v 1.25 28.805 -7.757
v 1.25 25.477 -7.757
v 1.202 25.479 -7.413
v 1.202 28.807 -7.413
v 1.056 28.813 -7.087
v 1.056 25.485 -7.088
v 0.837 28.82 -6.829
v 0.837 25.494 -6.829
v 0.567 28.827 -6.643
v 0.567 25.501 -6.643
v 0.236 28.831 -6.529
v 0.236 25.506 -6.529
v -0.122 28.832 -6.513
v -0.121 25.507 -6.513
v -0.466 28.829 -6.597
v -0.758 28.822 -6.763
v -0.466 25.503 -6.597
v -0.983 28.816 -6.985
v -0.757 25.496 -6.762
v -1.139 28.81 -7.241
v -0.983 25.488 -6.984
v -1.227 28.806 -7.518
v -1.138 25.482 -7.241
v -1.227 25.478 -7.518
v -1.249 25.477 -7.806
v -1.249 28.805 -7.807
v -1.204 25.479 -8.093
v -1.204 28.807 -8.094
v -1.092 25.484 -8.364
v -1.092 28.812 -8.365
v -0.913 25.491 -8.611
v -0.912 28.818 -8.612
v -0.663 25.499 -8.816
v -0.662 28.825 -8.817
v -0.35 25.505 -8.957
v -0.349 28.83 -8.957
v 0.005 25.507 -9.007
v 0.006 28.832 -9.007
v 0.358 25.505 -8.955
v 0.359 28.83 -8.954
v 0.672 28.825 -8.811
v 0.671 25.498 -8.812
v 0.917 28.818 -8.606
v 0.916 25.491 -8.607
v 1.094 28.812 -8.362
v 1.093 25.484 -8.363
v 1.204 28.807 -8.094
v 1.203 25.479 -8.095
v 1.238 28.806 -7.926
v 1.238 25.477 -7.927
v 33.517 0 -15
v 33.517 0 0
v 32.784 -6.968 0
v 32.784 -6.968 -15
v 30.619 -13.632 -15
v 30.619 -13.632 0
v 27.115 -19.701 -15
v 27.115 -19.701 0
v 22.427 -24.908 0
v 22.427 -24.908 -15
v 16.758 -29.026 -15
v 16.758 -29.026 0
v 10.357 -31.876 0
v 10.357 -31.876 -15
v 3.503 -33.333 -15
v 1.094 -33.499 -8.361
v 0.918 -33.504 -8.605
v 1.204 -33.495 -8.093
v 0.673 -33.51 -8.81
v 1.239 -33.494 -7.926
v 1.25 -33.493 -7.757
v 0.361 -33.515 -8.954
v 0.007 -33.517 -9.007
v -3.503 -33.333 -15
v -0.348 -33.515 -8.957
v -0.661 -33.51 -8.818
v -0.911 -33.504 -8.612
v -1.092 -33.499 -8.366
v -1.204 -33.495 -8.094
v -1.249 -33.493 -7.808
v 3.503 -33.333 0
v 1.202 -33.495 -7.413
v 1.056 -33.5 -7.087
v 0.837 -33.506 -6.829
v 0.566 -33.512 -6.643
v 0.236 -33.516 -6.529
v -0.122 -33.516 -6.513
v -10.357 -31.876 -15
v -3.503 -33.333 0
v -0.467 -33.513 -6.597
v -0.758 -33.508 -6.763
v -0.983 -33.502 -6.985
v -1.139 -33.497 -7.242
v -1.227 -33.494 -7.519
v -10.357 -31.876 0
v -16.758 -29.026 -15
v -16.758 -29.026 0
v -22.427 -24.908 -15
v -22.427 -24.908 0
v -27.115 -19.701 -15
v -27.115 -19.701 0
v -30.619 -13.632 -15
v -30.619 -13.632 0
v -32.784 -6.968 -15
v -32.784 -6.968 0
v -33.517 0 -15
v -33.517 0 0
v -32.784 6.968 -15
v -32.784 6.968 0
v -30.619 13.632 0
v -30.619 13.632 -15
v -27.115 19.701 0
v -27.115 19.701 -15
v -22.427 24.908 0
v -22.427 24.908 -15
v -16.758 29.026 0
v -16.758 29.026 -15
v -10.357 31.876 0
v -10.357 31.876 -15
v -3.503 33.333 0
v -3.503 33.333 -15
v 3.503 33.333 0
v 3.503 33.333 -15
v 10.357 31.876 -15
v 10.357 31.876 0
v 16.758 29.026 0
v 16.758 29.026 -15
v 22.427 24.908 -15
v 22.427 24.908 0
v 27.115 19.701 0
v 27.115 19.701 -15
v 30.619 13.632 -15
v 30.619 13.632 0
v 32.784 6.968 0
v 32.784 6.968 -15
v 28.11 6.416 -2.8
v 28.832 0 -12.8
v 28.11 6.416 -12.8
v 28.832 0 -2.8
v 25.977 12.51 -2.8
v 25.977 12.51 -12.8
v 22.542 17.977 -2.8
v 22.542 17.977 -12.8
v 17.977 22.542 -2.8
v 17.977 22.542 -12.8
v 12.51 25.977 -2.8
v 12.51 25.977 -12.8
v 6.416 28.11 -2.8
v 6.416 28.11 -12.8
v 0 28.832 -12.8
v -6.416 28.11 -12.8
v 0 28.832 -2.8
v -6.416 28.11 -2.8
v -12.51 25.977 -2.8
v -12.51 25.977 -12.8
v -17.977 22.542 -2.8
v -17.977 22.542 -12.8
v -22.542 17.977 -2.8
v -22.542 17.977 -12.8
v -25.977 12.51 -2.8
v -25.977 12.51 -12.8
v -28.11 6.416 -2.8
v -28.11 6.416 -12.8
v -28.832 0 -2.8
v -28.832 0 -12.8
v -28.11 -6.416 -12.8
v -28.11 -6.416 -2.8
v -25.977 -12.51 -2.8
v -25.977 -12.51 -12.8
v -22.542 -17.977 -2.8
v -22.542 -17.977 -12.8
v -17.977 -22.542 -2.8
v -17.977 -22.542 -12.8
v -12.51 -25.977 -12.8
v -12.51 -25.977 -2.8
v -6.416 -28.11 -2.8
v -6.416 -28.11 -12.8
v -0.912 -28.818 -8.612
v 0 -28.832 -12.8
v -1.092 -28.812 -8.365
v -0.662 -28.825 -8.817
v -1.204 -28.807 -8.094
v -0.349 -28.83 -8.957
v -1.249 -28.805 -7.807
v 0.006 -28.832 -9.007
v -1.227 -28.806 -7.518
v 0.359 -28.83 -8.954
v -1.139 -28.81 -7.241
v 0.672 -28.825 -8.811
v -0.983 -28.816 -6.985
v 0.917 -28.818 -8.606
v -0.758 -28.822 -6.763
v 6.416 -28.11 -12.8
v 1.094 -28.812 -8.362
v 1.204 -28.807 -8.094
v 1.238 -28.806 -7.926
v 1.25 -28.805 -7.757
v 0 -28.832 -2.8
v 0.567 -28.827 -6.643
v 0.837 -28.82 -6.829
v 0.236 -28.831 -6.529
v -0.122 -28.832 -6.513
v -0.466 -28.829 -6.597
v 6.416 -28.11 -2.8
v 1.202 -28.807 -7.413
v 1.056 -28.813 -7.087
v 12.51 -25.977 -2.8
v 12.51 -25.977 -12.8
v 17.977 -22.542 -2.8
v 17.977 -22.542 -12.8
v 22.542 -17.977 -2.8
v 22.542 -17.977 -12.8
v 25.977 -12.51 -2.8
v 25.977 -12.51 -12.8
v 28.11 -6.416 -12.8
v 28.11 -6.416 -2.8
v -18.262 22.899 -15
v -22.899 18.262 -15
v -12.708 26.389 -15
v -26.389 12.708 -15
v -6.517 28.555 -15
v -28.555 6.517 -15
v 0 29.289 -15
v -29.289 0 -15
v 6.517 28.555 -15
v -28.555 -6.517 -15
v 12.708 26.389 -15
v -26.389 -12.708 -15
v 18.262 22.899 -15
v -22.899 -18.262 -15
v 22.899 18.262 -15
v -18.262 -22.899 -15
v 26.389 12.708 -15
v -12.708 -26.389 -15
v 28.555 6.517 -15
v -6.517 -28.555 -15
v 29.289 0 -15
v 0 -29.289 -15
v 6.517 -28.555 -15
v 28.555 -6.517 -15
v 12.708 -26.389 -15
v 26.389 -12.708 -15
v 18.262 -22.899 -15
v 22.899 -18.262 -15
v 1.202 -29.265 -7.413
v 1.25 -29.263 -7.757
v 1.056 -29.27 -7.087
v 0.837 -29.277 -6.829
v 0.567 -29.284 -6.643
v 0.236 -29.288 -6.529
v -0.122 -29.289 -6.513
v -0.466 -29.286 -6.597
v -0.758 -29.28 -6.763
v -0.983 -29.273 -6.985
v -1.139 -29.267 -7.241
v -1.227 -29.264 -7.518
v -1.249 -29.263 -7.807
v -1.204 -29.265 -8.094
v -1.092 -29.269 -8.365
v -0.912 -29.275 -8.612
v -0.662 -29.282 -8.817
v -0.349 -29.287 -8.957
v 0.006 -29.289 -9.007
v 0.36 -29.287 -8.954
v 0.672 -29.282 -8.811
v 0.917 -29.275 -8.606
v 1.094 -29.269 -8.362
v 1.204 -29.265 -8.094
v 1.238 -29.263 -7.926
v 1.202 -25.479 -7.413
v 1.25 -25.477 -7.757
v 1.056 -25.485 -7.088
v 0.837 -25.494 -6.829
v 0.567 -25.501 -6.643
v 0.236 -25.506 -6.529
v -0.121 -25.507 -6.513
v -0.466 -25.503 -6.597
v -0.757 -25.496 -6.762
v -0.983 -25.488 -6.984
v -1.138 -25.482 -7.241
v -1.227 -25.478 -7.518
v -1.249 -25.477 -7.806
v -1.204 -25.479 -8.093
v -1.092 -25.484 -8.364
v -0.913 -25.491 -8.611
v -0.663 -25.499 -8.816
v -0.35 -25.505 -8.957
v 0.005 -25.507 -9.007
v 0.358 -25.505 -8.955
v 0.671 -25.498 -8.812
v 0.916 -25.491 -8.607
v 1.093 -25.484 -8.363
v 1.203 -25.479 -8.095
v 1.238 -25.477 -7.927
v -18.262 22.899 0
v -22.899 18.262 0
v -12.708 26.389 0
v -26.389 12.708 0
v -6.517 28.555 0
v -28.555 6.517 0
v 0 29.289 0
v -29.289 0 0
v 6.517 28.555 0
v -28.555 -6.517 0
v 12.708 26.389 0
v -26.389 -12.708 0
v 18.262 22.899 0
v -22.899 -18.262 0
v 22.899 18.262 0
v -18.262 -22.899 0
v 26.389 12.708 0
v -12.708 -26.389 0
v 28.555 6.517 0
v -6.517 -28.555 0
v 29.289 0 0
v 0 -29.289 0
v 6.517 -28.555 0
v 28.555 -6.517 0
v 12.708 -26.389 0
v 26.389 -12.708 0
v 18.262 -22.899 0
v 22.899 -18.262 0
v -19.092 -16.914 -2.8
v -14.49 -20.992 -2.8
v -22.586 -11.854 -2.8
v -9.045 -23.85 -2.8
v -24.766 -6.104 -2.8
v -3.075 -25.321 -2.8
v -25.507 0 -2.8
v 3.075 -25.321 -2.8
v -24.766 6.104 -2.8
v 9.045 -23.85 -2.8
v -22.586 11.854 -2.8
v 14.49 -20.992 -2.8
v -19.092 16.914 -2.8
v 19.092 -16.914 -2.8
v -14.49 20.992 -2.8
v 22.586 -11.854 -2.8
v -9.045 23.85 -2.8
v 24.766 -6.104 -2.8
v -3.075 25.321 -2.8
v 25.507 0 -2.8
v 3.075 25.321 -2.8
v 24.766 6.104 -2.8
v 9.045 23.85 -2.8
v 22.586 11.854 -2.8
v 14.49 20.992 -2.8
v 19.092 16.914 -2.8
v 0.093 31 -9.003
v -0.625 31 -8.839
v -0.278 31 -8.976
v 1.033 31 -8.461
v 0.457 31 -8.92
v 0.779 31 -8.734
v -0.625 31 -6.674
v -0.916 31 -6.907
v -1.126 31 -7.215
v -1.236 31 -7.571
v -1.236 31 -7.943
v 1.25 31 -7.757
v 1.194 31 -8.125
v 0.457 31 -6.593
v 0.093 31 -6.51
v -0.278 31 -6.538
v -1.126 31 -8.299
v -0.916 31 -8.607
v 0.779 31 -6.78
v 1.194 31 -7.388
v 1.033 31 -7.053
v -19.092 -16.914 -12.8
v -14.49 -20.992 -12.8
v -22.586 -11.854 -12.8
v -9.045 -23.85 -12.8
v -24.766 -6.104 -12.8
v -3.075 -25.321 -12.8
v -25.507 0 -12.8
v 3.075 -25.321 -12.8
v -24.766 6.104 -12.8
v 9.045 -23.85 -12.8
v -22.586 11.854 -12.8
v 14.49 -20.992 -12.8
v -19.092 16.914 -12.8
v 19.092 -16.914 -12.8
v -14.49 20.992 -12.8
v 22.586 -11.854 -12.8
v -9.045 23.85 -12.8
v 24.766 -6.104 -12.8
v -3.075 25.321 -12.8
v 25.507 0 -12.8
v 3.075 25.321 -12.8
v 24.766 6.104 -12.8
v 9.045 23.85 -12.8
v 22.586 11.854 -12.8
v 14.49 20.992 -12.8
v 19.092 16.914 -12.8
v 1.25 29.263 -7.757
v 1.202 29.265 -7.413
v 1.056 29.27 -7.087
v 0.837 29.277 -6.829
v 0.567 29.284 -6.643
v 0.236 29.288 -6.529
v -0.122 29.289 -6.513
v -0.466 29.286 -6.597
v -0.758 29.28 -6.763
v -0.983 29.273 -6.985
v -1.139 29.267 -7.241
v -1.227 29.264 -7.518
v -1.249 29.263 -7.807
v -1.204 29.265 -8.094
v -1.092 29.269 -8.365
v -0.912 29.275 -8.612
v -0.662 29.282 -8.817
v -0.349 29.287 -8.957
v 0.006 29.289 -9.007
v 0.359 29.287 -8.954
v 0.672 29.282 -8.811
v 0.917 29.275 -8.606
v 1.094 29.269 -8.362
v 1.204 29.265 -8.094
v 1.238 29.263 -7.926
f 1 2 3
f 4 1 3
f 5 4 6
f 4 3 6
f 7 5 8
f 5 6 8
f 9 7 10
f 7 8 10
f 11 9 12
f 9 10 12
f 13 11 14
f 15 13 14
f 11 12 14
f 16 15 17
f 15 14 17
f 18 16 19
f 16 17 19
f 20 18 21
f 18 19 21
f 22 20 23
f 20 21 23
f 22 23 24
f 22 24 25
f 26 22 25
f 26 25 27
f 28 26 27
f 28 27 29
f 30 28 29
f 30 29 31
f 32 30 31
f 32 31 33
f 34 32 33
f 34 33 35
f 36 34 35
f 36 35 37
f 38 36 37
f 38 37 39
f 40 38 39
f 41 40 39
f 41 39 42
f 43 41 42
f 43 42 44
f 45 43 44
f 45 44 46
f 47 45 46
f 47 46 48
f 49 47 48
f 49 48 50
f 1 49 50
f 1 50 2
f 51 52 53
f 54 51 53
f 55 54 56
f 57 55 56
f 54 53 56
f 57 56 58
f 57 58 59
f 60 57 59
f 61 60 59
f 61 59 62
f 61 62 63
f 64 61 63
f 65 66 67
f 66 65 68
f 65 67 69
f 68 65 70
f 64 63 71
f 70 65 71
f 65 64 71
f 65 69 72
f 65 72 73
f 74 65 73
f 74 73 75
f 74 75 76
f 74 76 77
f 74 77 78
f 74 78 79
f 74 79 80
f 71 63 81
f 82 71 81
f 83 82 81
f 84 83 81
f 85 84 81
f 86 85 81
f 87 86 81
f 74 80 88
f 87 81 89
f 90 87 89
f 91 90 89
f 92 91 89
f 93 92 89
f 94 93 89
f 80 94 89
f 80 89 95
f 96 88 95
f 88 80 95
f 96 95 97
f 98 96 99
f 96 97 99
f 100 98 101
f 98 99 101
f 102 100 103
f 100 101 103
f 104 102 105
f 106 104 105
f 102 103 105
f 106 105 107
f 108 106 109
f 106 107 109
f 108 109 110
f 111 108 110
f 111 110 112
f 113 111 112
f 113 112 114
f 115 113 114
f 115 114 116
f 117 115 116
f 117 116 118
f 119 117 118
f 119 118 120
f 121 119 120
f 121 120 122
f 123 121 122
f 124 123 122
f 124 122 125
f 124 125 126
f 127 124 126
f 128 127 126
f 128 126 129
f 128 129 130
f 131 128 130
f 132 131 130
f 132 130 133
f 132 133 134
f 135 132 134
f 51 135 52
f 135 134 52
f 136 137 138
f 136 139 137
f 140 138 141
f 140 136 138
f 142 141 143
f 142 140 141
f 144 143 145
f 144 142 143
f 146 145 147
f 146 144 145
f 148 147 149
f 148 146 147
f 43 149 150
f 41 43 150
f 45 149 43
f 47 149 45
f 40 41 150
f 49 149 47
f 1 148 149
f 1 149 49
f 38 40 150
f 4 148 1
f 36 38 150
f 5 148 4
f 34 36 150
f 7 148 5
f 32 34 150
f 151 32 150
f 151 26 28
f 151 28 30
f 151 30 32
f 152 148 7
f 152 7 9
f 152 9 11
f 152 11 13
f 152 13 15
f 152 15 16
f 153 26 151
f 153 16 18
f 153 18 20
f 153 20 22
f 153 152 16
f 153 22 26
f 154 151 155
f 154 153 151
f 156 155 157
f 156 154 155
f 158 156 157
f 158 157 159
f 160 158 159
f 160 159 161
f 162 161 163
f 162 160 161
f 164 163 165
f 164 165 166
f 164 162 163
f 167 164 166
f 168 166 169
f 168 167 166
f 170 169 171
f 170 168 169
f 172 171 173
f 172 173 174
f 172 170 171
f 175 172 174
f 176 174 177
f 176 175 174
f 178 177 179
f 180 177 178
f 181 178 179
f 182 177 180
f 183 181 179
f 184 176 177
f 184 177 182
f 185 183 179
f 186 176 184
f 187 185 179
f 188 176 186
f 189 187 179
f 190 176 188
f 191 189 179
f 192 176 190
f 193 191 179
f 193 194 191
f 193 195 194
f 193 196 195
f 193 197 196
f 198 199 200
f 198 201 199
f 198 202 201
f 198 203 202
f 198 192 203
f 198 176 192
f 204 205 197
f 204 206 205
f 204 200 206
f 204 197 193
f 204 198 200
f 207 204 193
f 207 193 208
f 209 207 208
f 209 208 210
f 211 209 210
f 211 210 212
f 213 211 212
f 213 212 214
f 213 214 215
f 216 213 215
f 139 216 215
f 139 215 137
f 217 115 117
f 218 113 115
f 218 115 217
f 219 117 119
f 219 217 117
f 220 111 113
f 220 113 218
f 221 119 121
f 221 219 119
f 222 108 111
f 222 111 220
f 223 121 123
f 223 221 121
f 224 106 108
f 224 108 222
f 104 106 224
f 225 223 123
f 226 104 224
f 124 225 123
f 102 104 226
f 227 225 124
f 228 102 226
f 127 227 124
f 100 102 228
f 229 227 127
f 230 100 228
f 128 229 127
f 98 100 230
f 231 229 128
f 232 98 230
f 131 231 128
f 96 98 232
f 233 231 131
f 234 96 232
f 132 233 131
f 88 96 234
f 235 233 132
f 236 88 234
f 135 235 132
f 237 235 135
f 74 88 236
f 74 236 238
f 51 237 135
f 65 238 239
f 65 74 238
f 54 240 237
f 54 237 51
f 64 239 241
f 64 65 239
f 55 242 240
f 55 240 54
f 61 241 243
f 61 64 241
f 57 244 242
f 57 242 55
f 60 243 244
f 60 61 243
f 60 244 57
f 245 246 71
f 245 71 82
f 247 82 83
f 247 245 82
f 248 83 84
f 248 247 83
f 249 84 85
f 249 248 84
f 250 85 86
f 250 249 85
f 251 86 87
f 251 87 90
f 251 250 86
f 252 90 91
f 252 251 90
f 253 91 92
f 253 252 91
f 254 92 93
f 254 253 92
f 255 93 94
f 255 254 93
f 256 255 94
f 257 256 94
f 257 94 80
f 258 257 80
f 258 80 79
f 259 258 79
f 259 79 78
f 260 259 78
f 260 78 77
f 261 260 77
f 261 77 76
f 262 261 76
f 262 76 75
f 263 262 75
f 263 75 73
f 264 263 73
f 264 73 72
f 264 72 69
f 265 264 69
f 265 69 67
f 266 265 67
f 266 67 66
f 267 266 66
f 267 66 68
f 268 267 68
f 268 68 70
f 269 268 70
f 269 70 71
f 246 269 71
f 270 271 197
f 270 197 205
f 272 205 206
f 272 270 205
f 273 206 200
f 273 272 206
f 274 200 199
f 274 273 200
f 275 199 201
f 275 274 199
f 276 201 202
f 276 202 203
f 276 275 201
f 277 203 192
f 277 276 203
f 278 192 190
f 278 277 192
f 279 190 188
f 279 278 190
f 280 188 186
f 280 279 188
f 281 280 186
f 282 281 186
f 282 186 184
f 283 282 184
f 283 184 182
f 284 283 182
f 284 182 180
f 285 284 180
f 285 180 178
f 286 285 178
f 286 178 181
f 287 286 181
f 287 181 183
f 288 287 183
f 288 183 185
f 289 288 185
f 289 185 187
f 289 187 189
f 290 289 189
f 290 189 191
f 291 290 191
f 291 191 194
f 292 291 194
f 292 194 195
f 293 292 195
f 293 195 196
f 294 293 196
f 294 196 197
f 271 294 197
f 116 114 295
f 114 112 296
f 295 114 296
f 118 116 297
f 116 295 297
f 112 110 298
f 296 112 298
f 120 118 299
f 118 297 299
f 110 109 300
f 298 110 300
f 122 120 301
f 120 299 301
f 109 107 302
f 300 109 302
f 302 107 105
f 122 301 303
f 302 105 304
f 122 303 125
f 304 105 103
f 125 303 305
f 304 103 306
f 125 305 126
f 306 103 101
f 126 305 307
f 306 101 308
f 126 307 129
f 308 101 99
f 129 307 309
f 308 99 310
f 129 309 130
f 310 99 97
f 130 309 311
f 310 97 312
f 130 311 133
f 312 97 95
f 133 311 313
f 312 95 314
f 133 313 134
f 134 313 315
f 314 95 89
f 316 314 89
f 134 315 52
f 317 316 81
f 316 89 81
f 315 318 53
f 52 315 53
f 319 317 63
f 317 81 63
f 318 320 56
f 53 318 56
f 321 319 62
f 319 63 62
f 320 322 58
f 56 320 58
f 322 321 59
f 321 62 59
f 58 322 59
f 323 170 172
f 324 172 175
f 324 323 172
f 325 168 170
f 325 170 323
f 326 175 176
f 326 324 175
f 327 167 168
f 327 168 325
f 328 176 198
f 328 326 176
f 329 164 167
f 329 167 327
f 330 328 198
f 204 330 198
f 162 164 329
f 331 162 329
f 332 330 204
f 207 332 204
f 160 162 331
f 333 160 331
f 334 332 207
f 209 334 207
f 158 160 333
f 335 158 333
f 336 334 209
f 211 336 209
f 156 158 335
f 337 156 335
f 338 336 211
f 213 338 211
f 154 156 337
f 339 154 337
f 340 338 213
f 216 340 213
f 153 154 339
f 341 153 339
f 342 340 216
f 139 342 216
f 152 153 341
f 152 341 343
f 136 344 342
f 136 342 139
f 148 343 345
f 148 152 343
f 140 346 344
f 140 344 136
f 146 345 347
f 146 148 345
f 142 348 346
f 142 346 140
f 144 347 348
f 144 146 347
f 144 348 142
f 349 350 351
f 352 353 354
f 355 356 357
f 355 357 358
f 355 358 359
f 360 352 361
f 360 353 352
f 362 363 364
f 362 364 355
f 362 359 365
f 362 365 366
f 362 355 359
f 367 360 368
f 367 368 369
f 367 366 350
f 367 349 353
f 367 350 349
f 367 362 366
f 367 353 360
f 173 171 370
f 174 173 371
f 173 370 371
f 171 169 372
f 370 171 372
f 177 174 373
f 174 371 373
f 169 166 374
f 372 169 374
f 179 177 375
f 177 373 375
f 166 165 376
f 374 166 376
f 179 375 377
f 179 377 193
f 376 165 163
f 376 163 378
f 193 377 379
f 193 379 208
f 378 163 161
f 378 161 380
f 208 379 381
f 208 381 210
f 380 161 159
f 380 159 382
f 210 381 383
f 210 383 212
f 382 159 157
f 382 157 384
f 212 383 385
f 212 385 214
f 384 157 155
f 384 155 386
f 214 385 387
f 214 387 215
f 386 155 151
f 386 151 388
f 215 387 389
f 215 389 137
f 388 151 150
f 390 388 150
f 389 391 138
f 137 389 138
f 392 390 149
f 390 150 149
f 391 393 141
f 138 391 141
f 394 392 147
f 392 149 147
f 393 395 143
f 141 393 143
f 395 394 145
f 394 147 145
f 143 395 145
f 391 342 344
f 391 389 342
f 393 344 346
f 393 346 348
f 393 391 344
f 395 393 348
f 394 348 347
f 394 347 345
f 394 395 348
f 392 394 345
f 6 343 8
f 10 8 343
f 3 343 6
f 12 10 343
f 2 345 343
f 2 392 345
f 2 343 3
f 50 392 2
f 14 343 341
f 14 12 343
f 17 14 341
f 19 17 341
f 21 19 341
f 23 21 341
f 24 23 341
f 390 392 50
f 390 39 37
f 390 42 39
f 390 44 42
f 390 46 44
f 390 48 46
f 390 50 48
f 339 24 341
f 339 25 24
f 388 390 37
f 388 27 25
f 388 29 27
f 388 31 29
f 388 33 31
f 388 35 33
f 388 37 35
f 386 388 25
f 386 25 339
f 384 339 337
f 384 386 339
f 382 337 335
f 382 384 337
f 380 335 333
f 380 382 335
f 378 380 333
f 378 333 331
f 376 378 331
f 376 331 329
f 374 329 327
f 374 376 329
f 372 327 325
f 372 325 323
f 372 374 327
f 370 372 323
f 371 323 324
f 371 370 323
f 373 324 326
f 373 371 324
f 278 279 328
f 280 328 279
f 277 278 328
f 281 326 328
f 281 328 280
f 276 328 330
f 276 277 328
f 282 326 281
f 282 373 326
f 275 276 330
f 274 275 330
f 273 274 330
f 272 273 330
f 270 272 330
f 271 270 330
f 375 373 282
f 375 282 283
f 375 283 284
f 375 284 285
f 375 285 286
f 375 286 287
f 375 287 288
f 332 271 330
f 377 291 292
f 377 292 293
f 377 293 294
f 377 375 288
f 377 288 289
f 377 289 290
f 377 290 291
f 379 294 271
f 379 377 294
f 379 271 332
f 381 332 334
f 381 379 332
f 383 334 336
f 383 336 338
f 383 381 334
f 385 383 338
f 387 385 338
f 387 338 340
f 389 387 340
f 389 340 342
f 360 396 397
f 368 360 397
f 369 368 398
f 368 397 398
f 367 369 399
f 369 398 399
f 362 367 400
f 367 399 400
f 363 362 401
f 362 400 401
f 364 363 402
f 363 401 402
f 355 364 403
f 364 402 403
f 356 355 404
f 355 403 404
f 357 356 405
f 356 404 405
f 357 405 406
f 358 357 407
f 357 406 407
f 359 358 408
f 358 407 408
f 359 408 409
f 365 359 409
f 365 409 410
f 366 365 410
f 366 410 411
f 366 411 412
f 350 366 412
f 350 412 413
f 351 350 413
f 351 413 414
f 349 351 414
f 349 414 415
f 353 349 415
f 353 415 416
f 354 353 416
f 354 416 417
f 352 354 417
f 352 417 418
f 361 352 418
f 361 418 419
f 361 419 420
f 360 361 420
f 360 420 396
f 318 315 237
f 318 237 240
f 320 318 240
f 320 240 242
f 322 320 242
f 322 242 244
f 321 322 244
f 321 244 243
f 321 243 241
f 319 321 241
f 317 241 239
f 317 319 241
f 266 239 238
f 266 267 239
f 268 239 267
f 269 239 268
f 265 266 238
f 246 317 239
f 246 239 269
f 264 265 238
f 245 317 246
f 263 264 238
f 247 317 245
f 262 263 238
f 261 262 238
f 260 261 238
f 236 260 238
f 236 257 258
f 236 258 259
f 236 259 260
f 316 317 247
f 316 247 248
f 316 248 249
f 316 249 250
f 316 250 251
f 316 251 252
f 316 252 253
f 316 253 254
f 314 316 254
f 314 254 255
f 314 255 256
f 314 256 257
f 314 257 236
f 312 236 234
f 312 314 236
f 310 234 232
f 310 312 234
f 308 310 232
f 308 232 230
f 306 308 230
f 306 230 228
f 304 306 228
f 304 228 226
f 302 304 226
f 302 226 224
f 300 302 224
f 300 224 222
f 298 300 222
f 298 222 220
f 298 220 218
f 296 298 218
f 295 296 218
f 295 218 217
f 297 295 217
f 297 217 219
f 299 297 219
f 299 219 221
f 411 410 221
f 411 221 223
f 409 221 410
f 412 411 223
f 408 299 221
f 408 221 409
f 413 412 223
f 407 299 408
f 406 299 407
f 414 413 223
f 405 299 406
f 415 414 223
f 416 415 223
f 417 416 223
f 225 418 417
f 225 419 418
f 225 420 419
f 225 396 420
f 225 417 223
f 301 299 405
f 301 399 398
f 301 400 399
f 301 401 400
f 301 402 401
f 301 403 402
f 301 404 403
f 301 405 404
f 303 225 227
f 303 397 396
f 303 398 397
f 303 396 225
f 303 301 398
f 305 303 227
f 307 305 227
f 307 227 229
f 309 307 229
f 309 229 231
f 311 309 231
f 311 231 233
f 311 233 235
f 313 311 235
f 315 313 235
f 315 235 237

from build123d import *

# Parameters (mm, degrees)
F2_R      = 45.826779
F0_R      = 28.670847
F4_T      = -2.5
F5_R      = 33.51658
F5_R_2    = 29.289311
F6_DEPTH  = 15
F9_R      = 28.832409
F9_R_2    = 25.507292
F10_DEPTH = 5
F11_R     = 1.25
F12_DEPTH = 33.51758
F13_DEPTH = 31


with BuildPart() as f3:
    # F2 (on offset) → F3 section 0
    with BuildSketch(Plane.XY.offset(140)):
        with Locations((0, 0.277012)):
            Circle(F2_R)
    # F0 (on Top) → F3 section 1
    with BuildSketch(Plane.XY):
        with Locations((0, -0.265393)):
            Circle(F0_R)
    loft()

    # F4
    f4_openings = [f3.faces().sort_by_distance(p)[0] for p in [
        (0, 0.277012, 140),
    ]]
    offset(amount=F4_T, openings=f4_openings)


with BuildPart() as f6:
    # F5 (on face) → F6 (new body)
    with BuildSketch(Plane(origin=(0, 0, 0), x_dir=(1, 0, 0), z_dir=(0, 0, -1))):
        Circle(F5_R)
        Circle(F5_R_2, mode=Mode.SUBTRACT)
    extrude(amount=F6_DEPTH)


with BuildPart() as f10:
    # F9 (on offset) → F10 (new body, symmetric)
    with BuildSketch(Plane.XY.offset(-7.8)):
        Circle(F9_R)
        Circle(F9_R_2, mode=Mode.SUBTRACT)
    extrude(amount=F10_DEPTH, both=True)


with BuildPart() as f12_tool:
    # F11 (on Front) → F12 (new body, through all)
    with BuildSketch(Plane.XZ):
        with Locations((0, -7.756886)):
            Circle(F11_R)
    extrude(amount=F12_DEPTH)


with BuildPart() as f6_1:
    add(f6.part)

    # F12: cut by f12_tool
    add(f12_tool.part, mode=Mode.SUBTRACT)


with BuildPart() as f10_1:
    add(f10.part)

    # F12: cut by f12_tool
    add(f12_tool.part, mode=Mode.SUBTRACT)


with BuildPart() as f13_tool:
    # F11 (on Front) → F13 (new body)
    with BuildSketch(Plane.XZ):
        with Locations((0, -7.756886)):
            Circle(F11_R)
    extrude(amount=-F13_DEPTH)


with BuildPart() as f6_2:
    add(f6_1.part)

    # F13: cut by f13_tool
    add(f13_tool.part, mode=Mode.SUBTRACT)


with BuildPart() as f10_2:
    add(f10_1.part)

    # F13: cut by f13_tool
    add(f13_tool.part, mode=Mode.SUBTRACT)


solid = Compound([f6_2.part, f10_2.part])
